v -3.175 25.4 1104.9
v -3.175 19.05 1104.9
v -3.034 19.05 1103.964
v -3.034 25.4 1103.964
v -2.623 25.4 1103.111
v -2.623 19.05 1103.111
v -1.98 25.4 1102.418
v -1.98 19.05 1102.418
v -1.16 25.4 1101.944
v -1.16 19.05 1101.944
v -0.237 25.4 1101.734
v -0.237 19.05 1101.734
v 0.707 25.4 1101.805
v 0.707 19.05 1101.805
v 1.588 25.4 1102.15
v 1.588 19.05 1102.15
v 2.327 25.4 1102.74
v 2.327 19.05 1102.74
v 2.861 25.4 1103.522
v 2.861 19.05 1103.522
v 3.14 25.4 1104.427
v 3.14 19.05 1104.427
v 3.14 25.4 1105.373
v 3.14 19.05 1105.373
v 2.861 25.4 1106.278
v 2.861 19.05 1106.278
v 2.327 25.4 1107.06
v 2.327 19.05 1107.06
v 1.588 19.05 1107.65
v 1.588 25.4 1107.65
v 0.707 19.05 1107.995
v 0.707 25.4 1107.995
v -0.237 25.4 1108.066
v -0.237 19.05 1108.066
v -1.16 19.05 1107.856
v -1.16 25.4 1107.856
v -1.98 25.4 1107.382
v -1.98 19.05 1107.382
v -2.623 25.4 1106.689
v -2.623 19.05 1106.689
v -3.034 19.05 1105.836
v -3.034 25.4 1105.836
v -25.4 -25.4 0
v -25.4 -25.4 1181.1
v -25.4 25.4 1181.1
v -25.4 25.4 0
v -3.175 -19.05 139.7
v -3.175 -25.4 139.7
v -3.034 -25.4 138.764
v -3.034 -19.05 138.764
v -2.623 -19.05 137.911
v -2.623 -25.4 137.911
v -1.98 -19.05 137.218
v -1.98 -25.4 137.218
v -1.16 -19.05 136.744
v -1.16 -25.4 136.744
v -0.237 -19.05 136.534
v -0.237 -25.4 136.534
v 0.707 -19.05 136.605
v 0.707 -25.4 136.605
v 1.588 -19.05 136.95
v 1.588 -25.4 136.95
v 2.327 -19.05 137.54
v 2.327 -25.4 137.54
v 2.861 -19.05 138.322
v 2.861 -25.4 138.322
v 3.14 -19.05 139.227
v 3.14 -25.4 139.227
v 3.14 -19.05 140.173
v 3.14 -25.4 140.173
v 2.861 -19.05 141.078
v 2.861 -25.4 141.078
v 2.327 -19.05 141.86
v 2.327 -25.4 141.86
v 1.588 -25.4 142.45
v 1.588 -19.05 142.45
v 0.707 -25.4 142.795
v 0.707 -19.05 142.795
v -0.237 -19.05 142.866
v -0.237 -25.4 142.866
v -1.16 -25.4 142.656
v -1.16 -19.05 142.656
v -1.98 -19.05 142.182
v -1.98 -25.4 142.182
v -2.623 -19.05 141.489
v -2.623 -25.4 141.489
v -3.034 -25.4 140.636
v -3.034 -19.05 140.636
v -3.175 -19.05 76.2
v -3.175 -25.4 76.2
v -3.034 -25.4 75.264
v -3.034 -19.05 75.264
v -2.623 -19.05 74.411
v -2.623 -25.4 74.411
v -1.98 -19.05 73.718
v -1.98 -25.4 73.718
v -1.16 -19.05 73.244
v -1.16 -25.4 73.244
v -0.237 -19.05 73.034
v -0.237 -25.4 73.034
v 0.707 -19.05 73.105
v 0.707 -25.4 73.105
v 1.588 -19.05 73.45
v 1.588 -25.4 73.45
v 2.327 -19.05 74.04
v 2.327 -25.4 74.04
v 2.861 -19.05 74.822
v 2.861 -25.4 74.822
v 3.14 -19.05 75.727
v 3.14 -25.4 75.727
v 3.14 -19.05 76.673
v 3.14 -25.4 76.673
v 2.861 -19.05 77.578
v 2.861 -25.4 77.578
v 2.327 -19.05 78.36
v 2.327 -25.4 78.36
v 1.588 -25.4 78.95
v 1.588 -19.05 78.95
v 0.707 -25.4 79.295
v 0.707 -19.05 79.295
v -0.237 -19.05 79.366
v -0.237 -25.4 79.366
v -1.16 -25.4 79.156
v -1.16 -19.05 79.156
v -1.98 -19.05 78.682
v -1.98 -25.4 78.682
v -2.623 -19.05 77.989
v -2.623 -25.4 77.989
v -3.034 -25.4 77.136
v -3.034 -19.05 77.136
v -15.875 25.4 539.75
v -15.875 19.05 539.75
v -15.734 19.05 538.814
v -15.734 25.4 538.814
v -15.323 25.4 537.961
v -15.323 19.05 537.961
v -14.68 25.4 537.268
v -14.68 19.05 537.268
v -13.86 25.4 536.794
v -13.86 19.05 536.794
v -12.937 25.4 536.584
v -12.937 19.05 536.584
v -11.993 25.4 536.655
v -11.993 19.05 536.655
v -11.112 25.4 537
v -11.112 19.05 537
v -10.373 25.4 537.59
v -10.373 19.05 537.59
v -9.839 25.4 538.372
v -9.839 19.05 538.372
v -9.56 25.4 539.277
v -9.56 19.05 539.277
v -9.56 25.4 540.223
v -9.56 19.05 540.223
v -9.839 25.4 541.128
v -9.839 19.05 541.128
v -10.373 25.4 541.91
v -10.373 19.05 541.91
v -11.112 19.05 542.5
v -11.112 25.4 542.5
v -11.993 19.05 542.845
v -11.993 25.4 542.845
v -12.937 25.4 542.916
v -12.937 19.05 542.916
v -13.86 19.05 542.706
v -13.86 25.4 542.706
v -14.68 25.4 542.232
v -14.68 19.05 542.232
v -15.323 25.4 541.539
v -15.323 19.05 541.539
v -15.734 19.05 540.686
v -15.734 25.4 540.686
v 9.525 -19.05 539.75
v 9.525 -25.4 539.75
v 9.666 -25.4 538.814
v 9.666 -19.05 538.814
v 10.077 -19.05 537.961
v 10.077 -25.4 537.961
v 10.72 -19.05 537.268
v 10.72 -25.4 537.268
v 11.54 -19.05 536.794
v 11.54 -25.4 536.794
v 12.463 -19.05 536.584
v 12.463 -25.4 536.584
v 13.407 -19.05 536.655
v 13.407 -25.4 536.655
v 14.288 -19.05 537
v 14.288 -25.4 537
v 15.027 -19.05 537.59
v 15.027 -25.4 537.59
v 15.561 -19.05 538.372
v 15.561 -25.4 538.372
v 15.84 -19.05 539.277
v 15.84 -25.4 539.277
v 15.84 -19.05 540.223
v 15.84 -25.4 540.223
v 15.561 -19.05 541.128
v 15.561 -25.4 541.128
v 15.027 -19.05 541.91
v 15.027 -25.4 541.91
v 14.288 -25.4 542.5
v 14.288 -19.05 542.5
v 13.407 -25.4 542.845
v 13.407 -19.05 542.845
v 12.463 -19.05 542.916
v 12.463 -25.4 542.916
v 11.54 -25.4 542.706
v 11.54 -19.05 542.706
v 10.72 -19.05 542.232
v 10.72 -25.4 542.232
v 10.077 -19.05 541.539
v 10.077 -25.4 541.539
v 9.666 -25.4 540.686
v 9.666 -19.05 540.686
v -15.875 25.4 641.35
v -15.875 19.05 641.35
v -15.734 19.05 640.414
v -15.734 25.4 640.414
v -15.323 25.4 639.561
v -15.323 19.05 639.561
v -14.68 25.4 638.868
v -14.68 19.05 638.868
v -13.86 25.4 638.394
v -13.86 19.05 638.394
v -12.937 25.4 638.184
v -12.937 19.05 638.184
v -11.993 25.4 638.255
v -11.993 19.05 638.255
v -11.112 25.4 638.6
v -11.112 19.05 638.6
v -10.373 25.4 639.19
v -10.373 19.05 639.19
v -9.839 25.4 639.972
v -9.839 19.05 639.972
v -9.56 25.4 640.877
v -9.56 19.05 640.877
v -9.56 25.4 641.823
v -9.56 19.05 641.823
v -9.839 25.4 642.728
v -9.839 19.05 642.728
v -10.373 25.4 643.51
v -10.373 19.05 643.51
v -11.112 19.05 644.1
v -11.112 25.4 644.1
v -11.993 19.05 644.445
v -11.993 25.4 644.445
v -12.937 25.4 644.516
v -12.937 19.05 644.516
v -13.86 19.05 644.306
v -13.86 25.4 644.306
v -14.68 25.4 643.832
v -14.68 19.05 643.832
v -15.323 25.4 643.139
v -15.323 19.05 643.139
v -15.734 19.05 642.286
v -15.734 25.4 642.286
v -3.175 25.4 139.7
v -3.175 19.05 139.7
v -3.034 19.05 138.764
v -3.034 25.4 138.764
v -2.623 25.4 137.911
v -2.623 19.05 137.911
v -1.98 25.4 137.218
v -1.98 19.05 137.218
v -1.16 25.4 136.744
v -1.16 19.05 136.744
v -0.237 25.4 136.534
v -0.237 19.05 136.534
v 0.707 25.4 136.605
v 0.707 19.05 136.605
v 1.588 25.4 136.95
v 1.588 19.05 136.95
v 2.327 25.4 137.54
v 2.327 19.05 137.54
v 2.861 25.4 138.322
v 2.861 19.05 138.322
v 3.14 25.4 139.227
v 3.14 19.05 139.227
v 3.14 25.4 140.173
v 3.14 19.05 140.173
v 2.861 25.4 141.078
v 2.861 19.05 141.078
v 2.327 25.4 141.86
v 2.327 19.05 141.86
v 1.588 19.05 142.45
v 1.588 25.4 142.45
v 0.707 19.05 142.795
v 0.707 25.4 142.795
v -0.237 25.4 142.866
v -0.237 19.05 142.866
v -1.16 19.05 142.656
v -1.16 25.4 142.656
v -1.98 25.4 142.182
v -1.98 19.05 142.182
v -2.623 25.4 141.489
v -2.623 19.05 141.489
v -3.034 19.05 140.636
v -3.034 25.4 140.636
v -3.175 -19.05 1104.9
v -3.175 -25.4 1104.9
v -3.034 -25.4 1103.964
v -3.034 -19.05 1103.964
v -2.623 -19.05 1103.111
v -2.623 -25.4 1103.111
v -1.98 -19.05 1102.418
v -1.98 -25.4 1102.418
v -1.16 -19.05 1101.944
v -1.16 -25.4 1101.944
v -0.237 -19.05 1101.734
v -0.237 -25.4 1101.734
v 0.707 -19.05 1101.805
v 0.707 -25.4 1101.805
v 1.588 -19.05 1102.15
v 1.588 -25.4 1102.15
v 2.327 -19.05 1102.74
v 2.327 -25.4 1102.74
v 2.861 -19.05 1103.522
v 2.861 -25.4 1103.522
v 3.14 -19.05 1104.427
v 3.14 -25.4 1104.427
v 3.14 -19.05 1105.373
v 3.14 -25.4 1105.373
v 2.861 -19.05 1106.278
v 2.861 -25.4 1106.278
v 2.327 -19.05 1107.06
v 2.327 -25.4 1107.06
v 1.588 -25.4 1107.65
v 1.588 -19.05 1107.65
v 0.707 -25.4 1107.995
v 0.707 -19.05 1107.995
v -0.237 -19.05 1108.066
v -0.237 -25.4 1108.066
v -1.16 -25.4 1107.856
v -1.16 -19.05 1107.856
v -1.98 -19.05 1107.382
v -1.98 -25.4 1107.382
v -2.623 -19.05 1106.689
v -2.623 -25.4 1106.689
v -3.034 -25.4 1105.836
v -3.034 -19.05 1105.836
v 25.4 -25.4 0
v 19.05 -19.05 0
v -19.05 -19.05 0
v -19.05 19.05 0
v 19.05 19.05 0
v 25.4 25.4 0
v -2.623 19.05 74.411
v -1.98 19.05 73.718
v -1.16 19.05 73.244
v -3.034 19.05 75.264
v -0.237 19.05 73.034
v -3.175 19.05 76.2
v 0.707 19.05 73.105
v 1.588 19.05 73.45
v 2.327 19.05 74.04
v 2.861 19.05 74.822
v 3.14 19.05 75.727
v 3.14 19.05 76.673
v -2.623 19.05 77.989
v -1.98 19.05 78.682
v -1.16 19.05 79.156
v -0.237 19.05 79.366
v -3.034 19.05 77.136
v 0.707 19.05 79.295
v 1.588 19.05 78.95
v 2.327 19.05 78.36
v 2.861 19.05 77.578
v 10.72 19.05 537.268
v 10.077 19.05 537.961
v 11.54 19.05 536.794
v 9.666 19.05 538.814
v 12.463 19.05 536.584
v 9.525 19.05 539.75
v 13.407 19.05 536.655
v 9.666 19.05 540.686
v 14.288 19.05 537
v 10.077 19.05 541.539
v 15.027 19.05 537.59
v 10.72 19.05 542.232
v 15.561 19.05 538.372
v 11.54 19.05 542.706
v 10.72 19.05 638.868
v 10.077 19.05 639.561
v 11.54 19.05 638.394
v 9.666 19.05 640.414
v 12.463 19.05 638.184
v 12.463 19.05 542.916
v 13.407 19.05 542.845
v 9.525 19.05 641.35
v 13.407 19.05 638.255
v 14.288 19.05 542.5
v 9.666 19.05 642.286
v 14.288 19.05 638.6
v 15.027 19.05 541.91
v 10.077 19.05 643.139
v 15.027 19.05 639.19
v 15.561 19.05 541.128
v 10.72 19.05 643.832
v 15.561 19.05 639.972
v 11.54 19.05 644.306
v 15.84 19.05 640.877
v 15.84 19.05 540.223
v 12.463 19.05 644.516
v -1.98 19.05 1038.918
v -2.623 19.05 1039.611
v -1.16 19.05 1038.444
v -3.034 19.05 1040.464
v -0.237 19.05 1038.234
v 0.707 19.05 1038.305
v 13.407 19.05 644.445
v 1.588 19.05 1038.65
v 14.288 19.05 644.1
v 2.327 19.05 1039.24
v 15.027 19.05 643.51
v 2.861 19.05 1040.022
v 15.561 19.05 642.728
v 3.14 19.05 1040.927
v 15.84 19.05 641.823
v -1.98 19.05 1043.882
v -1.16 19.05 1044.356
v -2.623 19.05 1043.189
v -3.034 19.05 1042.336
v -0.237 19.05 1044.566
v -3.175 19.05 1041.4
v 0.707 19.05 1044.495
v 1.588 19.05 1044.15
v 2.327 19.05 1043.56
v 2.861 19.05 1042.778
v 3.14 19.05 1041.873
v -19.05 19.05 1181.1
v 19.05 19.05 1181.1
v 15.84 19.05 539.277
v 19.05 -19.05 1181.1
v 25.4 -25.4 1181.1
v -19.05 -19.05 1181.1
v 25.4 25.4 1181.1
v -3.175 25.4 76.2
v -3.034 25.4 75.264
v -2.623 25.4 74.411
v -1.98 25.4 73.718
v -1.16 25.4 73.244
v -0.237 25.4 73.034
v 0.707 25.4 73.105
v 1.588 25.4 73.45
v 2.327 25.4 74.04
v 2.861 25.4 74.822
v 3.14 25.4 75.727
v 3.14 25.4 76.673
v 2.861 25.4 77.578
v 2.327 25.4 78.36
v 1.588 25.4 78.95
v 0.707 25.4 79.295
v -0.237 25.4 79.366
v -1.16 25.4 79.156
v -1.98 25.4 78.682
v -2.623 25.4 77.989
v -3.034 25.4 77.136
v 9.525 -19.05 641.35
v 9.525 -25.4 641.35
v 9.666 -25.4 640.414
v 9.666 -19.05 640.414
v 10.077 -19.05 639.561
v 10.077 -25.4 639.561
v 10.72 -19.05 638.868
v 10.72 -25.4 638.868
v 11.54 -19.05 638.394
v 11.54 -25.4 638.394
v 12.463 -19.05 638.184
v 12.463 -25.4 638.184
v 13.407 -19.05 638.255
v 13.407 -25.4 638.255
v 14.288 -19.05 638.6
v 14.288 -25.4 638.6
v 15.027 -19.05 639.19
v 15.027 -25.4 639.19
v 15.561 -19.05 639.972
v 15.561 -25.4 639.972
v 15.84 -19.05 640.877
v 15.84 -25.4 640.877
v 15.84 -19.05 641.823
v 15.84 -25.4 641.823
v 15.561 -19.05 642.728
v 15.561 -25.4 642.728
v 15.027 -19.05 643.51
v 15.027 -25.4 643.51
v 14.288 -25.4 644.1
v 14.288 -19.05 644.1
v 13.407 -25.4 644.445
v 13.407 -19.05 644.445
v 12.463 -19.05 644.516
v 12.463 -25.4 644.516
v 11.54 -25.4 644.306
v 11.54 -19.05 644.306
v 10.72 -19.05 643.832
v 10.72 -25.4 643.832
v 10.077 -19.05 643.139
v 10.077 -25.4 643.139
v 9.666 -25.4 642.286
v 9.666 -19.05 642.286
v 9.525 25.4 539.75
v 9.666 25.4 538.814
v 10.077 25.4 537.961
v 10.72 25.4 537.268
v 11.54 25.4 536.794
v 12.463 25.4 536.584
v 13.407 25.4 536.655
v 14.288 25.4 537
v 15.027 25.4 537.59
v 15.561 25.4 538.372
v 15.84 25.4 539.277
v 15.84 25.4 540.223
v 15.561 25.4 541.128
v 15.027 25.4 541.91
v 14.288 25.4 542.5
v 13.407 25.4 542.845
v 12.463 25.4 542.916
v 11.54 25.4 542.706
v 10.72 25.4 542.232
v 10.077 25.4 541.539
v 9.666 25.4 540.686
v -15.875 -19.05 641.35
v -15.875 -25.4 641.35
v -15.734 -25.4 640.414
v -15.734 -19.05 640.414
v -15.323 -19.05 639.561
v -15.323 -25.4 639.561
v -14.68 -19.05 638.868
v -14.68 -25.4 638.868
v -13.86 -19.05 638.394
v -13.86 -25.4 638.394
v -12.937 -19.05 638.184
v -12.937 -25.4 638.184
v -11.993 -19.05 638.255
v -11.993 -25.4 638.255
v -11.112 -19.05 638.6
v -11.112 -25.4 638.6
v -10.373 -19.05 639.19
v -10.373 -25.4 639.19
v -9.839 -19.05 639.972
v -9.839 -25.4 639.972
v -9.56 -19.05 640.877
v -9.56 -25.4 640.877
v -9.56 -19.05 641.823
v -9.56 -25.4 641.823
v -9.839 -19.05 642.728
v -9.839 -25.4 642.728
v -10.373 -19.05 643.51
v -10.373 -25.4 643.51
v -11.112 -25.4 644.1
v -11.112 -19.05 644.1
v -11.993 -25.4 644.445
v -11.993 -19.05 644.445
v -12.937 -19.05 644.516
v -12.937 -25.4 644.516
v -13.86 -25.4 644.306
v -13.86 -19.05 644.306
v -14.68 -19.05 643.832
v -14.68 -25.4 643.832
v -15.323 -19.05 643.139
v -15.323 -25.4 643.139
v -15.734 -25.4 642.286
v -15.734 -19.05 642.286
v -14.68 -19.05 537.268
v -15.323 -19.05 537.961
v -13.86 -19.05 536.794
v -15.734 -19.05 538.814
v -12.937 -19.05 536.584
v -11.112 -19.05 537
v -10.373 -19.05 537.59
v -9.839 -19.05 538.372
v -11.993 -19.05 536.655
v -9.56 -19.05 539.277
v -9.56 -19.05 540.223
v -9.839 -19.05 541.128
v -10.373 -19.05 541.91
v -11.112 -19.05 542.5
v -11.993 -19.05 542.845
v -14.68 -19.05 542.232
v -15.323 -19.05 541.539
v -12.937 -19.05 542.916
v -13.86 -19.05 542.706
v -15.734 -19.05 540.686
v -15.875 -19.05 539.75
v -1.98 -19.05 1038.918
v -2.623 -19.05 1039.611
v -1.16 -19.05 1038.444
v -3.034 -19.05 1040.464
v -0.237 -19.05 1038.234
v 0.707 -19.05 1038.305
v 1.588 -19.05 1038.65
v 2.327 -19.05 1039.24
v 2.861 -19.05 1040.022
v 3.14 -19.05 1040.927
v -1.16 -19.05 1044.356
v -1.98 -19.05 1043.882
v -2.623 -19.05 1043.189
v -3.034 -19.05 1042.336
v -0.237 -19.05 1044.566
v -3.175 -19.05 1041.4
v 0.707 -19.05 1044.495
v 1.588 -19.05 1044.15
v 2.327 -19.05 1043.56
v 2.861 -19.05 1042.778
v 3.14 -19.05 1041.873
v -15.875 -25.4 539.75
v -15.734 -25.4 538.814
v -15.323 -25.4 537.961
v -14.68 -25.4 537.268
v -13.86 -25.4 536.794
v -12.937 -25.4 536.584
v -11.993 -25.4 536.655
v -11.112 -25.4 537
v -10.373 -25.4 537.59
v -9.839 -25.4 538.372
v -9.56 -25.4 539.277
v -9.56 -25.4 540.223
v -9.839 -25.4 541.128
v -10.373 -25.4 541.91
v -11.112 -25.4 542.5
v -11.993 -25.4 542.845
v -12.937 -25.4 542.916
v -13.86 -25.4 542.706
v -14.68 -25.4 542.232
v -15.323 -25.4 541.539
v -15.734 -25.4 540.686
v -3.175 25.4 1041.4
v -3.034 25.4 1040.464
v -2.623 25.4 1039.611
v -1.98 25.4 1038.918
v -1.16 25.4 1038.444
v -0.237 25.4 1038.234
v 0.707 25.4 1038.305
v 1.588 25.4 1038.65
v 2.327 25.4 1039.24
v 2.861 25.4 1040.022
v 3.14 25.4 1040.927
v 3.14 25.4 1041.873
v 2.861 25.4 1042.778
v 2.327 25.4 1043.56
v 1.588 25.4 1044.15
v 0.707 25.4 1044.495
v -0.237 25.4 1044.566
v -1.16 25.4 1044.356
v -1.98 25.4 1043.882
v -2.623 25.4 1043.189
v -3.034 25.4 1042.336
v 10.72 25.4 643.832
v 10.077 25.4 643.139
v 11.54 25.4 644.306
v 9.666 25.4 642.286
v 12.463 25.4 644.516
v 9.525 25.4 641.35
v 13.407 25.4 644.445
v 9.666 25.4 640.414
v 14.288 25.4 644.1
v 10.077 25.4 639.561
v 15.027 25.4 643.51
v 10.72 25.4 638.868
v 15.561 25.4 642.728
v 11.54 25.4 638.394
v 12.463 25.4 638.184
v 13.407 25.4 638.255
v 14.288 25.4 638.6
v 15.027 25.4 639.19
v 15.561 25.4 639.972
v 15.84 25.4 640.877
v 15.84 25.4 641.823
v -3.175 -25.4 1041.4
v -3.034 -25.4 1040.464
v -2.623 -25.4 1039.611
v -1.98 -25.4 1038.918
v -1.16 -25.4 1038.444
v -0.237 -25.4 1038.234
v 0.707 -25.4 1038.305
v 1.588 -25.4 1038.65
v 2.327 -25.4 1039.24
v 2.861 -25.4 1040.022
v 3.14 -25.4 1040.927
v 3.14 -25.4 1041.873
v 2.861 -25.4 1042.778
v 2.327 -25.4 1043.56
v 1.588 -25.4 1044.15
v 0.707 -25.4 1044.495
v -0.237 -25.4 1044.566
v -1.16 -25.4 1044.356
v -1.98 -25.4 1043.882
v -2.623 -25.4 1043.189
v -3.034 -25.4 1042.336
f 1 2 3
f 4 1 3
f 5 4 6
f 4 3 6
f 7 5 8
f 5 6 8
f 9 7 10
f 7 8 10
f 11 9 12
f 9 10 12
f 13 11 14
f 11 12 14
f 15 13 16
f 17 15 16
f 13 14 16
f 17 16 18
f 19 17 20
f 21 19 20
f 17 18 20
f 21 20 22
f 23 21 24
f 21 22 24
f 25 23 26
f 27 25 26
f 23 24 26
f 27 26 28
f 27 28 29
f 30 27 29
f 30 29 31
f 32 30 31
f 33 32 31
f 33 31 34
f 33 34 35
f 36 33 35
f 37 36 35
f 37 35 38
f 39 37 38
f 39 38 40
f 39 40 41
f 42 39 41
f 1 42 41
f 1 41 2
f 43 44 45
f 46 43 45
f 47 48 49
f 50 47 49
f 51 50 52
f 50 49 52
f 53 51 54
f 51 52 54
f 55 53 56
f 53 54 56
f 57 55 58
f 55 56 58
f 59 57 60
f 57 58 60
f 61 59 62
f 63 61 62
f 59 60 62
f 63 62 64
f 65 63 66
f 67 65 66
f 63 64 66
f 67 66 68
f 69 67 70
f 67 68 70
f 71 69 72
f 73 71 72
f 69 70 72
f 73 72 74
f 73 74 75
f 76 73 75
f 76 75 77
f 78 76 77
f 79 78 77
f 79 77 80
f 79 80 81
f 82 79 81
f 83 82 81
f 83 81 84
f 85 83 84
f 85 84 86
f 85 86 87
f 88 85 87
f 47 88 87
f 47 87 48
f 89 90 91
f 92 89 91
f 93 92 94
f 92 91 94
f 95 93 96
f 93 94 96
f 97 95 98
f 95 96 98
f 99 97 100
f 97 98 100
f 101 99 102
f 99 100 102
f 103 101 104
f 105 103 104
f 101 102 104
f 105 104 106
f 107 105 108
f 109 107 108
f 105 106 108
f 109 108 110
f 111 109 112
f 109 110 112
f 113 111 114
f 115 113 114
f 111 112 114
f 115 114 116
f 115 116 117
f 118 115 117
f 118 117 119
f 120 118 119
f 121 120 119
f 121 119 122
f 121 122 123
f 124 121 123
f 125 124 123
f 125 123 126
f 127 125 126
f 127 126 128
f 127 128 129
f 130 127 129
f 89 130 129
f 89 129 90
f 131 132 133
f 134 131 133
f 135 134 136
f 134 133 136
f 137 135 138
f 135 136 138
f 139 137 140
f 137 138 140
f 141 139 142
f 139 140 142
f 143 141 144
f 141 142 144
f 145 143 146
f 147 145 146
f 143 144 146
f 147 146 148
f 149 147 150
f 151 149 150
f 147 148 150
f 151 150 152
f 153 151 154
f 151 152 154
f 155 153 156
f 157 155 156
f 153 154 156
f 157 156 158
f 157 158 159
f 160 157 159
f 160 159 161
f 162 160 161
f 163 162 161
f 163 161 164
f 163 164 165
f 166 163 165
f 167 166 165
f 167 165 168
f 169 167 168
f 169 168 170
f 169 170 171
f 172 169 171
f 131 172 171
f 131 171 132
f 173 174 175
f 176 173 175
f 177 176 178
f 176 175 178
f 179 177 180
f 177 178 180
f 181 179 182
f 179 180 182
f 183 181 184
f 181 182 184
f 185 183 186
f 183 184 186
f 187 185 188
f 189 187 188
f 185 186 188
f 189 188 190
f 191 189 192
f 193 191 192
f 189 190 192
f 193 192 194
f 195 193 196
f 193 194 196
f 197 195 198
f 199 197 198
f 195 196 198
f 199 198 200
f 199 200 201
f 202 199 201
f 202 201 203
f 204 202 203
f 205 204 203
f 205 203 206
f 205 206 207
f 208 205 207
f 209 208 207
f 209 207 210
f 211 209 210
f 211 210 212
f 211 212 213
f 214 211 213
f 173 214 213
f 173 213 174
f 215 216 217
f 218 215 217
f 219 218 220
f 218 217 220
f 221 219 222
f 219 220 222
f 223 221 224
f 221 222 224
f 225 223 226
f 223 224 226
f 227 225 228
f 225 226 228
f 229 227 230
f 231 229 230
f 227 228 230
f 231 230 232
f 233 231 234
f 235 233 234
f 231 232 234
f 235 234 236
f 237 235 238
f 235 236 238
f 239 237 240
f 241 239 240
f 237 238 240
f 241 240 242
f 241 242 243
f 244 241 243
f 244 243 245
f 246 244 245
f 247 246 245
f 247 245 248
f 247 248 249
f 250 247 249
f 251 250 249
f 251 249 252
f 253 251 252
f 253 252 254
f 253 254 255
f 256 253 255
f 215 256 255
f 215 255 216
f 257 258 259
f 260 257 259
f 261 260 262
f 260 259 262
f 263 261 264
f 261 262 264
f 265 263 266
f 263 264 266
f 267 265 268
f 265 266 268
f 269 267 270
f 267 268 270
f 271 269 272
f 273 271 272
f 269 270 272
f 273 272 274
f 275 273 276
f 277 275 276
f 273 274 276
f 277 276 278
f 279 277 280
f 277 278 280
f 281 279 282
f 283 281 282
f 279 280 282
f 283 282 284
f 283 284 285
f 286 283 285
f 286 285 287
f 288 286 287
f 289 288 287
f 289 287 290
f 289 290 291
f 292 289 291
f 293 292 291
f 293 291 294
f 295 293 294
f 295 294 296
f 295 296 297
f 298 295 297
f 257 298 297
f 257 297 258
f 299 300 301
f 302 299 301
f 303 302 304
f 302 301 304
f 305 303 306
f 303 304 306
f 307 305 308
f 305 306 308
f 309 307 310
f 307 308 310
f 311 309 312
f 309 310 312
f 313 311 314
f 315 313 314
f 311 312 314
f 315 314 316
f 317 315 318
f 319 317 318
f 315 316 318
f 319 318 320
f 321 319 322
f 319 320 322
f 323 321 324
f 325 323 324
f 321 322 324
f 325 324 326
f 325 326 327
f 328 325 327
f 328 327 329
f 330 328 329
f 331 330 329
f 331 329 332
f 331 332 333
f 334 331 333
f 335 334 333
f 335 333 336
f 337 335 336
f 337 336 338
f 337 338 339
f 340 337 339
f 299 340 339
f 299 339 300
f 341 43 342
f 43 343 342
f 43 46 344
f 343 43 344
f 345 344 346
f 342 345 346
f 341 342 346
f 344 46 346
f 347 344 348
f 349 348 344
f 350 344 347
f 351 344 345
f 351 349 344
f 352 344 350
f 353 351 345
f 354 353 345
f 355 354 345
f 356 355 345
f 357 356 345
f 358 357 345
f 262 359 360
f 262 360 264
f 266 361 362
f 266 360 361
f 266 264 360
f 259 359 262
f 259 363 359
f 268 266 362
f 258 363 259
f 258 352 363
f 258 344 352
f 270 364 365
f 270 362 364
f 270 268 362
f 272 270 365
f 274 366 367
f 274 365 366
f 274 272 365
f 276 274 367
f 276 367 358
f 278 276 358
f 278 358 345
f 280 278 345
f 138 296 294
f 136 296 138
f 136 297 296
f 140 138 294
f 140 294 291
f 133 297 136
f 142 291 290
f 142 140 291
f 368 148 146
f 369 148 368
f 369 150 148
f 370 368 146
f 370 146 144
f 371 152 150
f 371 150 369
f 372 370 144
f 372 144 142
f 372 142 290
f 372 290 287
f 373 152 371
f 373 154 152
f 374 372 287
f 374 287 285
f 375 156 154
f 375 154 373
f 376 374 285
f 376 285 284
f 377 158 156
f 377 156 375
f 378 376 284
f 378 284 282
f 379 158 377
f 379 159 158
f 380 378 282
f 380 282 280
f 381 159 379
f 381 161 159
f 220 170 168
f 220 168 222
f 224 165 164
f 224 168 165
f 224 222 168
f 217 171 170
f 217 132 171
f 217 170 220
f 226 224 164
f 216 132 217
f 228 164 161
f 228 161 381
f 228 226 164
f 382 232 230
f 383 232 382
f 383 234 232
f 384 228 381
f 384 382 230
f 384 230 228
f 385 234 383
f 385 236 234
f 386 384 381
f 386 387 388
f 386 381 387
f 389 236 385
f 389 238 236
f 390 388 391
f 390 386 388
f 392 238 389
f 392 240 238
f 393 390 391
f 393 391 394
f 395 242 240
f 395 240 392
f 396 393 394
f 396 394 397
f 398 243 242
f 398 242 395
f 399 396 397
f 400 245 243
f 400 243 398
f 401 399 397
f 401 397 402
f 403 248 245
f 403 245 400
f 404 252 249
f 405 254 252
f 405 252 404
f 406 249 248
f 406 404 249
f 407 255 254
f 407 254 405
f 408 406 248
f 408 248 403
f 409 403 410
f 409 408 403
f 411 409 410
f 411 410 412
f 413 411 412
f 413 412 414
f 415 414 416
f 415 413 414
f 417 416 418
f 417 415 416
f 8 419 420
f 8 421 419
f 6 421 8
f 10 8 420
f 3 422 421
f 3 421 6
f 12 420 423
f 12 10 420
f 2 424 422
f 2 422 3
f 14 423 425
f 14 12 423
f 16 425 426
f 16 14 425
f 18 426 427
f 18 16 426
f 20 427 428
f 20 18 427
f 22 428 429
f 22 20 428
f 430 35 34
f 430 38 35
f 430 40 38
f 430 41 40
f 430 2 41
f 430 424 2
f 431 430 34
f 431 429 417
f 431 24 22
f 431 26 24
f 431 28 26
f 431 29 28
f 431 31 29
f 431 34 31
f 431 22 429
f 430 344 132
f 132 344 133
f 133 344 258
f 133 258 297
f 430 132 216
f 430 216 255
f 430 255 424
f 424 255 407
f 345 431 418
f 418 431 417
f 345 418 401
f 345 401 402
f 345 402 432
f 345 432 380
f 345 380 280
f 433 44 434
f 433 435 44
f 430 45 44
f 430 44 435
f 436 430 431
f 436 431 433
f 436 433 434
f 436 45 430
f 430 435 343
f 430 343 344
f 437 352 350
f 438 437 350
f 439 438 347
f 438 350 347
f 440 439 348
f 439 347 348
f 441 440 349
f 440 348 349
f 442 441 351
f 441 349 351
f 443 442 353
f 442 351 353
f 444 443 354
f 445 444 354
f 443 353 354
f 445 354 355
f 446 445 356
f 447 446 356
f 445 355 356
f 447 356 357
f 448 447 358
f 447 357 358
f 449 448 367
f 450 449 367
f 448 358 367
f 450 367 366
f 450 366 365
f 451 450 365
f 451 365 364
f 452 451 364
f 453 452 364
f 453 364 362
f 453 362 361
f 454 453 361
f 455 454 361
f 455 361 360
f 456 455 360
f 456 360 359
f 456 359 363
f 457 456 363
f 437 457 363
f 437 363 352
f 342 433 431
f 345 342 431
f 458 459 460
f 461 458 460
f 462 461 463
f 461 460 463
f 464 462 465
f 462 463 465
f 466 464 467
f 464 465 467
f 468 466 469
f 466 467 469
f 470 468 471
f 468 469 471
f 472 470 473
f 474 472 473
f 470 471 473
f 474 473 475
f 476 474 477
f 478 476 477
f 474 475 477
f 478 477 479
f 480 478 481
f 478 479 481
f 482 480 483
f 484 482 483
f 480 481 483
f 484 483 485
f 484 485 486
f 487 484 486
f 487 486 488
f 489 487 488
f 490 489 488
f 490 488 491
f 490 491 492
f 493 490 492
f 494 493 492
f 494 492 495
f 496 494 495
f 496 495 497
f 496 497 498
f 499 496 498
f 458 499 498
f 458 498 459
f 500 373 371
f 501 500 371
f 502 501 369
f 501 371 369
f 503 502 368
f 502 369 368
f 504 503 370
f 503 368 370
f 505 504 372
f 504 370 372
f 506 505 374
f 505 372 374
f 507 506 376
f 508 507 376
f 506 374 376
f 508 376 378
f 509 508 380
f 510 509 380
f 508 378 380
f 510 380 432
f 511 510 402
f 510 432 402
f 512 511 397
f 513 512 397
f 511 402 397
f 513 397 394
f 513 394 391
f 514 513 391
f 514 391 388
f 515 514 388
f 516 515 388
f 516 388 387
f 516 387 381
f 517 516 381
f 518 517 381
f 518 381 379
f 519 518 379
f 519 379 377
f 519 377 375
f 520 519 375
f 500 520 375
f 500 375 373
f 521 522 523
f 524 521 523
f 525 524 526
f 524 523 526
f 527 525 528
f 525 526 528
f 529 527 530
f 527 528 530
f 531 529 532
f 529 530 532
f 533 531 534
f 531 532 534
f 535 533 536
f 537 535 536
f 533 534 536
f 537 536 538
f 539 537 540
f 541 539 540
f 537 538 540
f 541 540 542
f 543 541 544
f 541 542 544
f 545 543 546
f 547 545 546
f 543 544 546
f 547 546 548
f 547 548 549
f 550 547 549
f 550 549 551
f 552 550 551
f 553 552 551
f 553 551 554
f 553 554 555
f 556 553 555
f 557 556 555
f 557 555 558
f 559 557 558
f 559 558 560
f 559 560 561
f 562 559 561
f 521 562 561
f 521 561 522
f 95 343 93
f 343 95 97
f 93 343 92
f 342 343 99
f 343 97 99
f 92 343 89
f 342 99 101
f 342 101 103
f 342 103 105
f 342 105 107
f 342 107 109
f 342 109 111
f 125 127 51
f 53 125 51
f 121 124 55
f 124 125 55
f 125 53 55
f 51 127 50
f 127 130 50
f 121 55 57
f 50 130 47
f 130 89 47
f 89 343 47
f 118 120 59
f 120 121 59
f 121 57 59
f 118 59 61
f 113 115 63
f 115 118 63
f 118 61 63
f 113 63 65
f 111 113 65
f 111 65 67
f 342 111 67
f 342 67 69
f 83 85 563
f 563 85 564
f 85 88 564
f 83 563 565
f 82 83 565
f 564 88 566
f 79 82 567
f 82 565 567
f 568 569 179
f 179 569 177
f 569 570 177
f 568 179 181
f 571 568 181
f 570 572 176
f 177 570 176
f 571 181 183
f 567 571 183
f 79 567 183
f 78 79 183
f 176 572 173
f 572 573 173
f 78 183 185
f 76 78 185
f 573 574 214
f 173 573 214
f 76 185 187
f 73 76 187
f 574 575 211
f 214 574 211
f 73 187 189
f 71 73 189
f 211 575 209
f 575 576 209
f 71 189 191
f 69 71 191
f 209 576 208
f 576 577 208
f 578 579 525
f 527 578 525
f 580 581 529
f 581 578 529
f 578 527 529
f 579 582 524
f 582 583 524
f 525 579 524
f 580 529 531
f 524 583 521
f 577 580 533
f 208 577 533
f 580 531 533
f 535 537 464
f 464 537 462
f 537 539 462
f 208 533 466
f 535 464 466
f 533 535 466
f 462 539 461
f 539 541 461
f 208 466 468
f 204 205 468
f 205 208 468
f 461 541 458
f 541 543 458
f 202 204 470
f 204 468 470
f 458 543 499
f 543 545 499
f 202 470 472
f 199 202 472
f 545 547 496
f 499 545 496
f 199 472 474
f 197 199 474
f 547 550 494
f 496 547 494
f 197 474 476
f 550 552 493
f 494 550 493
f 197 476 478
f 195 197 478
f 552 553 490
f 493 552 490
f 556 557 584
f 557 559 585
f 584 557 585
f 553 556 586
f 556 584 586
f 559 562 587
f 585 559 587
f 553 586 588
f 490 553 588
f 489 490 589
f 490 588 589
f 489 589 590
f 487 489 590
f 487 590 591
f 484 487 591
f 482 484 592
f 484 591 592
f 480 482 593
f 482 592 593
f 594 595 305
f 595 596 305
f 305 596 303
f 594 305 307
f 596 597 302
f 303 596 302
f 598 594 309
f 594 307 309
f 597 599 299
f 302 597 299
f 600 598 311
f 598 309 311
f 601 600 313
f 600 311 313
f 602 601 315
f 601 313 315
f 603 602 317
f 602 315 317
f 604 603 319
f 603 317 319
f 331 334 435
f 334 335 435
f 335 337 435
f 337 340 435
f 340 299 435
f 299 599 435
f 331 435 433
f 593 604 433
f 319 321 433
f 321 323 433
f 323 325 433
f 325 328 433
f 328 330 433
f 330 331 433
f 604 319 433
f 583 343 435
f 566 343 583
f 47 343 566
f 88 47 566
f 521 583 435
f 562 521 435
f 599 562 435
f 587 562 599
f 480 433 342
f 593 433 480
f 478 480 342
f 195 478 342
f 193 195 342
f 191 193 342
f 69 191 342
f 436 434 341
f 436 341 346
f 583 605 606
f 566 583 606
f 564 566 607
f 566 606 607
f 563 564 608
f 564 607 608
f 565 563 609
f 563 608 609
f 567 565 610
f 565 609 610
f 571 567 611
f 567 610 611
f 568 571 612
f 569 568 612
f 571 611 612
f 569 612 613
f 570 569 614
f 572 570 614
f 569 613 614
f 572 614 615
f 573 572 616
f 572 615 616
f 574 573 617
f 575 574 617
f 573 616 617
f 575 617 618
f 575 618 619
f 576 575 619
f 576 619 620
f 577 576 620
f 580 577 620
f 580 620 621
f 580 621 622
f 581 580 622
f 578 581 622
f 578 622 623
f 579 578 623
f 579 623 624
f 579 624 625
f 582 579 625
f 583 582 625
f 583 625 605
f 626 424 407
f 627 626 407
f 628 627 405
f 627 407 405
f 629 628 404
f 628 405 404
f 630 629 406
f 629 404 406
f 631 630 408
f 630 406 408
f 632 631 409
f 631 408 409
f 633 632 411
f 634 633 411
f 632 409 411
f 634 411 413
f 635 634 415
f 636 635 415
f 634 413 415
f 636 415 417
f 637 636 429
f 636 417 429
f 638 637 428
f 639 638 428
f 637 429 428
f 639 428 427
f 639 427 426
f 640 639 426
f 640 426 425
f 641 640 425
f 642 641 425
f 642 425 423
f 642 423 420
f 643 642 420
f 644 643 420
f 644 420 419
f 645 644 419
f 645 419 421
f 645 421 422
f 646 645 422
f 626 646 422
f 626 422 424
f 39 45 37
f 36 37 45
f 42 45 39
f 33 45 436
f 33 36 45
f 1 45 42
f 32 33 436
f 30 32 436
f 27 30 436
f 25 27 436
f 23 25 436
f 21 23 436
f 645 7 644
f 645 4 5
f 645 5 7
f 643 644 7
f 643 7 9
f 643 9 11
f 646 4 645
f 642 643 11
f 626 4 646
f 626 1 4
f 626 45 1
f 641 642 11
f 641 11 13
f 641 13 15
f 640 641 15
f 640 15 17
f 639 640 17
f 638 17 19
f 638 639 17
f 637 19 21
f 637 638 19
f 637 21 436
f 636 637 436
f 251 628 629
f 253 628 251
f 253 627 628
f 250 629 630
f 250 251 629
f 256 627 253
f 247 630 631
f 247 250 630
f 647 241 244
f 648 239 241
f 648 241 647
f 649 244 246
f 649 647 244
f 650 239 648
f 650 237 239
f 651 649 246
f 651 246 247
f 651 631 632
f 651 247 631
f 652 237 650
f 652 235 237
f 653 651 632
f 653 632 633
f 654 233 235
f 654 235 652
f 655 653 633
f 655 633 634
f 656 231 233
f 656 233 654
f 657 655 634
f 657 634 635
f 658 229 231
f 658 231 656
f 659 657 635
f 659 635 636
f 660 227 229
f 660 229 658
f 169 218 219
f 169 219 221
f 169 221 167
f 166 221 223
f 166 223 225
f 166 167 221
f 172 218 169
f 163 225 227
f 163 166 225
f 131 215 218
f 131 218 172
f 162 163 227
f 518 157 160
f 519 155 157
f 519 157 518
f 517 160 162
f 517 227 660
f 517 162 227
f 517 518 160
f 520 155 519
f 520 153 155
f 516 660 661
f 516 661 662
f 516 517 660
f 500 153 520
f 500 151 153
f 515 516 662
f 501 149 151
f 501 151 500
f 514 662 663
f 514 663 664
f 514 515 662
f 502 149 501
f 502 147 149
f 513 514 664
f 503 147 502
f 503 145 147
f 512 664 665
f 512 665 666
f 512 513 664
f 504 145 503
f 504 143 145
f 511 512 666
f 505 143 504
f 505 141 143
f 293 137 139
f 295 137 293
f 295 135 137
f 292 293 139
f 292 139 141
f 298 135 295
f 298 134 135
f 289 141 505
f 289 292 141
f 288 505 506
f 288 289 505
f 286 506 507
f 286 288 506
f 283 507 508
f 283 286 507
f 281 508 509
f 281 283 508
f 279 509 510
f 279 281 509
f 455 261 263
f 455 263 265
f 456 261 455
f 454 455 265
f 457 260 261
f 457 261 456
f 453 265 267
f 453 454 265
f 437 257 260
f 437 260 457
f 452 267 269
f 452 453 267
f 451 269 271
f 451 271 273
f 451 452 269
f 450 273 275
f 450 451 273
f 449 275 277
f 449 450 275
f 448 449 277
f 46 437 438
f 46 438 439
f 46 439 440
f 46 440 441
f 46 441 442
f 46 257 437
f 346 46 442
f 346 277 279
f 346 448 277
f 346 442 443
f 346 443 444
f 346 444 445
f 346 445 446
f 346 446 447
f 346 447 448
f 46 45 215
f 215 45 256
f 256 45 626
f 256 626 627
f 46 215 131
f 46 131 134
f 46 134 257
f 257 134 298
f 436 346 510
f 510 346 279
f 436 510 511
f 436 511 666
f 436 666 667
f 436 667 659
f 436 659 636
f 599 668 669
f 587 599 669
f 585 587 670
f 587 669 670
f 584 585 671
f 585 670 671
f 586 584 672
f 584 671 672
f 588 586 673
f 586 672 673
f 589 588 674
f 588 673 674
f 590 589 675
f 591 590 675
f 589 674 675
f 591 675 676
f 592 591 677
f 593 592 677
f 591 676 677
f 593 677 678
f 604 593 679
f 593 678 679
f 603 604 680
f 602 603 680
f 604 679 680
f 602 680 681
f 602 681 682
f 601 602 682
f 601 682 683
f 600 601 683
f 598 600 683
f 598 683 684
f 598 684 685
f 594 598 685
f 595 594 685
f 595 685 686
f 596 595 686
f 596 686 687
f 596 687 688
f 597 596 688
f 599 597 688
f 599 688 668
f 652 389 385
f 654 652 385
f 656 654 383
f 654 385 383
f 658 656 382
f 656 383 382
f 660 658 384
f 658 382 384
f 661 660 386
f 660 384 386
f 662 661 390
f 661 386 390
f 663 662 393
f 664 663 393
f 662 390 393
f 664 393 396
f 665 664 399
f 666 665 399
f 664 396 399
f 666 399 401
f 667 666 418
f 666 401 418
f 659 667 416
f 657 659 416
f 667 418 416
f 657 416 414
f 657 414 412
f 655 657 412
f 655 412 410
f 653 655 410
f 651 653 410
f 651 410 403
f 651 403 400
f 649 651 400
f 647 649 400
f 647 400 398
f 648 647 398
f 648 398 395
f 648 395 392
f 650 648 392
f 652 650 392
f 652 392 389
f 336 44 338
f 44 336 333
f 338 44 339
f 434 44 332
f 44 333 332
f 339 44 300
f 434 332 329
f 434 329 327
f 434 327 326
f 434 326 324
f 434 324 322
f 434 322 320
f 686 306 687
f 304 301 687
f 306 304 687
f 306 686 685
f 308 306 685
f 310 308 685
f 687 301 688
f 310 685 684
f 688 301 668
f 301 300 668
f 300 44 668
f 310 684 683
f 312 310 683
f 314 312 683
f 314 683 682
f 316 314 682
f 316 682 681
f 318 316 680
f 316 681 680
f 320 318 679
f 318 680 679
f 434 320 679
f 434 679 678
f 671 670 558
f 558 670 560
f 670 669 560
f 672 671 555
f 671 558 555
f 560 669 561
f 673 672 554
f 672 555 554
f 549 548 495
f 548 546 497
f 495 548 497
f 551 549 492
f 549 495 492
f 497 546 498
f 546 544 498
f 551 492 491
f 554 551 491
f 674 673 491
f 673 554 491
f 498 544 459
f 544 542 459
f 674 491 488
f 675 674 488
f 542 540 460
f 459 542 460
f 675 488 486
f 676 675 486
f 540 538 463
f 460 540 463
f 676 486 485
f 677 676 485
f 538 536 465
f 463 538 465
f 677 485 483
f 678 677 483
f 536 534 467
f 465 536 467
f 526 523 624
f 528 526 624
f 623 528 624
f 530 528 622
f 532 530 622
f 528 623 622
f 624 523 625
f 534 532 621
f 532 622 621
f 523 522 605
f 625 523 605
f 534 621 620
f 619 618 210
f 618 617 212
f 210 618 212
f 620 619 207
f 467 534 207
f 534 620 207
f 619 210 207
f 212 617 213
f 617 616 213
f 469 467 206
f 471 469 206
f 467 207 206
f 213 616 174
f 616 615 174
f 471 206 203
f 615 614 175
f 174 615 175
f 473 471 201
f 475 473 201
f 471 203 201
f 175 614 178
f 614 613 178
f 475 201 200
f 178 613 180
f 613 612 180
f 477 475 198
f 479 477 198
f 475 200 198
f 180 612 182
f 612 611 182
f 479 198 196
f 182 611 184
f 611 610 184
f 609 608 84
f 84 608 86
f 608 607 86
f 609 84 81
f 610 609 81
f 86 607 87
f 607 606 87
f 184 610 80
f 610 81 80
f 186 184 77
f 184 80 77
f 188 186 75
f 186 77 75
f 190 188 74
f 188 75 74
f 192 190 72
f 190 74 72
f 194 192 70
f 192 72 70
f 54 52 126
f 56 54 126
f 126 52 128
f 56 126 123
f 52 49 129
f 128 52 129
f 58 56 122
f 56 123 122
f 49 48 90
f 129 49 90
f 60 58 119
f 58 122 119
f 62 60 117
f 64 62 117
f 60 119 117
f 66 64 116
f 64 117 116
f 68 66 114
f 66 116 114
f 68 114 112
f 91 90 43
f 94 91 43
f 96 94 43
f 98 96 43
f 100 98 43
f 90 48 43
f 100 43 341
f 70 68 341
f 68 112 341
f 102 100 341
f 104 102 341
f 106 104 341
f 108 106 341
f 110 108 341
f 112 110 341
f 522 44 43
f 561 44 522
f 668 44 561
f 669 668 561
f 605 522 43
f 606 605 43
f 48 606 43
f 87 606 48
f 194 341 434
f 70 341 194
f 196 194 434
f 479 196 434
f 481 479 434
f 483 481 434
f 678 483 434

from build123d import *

# Parameters (mm, degrees)
SKETCH1_W                   = 50.8
SKETCH1_H                   = 50.8
BOSS_EXTRUDE1_DEPTH         = 1181.1
SKETCH8_W                   = 38.1
SKETCH8_H                   = 38.1
CUT_EXTRUDE1_DEPTH          = 1182.1
F_1_4_0_25_DIAMETER_HOLE1_D = 6.35
E_0_25_DIAMETER_HOLE2_D     = 6.35


with BuildPart() as part:
    # Sketch1 → Boss-Extrude1 (new body)
    with BuildSketch(Plane.XY):
        Rectangle(SKETCH1_W, SKETCH1_H)
    extrude(amount=BOSS_EXTRUDE1_DEPTH)

    # Sketch8 → Cut-Extrude1 (cut, through all)
    with BuildSketch(Plane.XY.offset(1181.1)):
        Rectangle(SKETCH8_W, SKETCH8_H)
    extrude(amount=-CUT_EXTRUDE1_DEPTH, mode=Mode.SUBTRACT)

    # 1/4 (0.25) Diameter Hole1 (through all)
    with Locations(Plane(origin=(0, 25.4, 0), x_dir=(1, 0, 0), z_dir=(0, 1, 0))):
        with Locations((-12.7, -641.35), (12.7, -641.35), (12.7, -539.75), (-12.7, -539.75)):
            Hole(F_1_4_0_25_DIAMETER_HOLE1_D / 2)

    # E (0.25) Diameter Hole2 (through all)
    with Locations(Plane(origin=(0, 25.4, 0), x_dir=(1, 0, 0), z_dir=(0, 1, 0))):
        with Locations((0, -1104.9), (0, -1041.4), (0, -139.7), (0, -76.2)):
            Hole(E_0_25_DIAMETER_HOLE2_D / 2)


solid = part.part
